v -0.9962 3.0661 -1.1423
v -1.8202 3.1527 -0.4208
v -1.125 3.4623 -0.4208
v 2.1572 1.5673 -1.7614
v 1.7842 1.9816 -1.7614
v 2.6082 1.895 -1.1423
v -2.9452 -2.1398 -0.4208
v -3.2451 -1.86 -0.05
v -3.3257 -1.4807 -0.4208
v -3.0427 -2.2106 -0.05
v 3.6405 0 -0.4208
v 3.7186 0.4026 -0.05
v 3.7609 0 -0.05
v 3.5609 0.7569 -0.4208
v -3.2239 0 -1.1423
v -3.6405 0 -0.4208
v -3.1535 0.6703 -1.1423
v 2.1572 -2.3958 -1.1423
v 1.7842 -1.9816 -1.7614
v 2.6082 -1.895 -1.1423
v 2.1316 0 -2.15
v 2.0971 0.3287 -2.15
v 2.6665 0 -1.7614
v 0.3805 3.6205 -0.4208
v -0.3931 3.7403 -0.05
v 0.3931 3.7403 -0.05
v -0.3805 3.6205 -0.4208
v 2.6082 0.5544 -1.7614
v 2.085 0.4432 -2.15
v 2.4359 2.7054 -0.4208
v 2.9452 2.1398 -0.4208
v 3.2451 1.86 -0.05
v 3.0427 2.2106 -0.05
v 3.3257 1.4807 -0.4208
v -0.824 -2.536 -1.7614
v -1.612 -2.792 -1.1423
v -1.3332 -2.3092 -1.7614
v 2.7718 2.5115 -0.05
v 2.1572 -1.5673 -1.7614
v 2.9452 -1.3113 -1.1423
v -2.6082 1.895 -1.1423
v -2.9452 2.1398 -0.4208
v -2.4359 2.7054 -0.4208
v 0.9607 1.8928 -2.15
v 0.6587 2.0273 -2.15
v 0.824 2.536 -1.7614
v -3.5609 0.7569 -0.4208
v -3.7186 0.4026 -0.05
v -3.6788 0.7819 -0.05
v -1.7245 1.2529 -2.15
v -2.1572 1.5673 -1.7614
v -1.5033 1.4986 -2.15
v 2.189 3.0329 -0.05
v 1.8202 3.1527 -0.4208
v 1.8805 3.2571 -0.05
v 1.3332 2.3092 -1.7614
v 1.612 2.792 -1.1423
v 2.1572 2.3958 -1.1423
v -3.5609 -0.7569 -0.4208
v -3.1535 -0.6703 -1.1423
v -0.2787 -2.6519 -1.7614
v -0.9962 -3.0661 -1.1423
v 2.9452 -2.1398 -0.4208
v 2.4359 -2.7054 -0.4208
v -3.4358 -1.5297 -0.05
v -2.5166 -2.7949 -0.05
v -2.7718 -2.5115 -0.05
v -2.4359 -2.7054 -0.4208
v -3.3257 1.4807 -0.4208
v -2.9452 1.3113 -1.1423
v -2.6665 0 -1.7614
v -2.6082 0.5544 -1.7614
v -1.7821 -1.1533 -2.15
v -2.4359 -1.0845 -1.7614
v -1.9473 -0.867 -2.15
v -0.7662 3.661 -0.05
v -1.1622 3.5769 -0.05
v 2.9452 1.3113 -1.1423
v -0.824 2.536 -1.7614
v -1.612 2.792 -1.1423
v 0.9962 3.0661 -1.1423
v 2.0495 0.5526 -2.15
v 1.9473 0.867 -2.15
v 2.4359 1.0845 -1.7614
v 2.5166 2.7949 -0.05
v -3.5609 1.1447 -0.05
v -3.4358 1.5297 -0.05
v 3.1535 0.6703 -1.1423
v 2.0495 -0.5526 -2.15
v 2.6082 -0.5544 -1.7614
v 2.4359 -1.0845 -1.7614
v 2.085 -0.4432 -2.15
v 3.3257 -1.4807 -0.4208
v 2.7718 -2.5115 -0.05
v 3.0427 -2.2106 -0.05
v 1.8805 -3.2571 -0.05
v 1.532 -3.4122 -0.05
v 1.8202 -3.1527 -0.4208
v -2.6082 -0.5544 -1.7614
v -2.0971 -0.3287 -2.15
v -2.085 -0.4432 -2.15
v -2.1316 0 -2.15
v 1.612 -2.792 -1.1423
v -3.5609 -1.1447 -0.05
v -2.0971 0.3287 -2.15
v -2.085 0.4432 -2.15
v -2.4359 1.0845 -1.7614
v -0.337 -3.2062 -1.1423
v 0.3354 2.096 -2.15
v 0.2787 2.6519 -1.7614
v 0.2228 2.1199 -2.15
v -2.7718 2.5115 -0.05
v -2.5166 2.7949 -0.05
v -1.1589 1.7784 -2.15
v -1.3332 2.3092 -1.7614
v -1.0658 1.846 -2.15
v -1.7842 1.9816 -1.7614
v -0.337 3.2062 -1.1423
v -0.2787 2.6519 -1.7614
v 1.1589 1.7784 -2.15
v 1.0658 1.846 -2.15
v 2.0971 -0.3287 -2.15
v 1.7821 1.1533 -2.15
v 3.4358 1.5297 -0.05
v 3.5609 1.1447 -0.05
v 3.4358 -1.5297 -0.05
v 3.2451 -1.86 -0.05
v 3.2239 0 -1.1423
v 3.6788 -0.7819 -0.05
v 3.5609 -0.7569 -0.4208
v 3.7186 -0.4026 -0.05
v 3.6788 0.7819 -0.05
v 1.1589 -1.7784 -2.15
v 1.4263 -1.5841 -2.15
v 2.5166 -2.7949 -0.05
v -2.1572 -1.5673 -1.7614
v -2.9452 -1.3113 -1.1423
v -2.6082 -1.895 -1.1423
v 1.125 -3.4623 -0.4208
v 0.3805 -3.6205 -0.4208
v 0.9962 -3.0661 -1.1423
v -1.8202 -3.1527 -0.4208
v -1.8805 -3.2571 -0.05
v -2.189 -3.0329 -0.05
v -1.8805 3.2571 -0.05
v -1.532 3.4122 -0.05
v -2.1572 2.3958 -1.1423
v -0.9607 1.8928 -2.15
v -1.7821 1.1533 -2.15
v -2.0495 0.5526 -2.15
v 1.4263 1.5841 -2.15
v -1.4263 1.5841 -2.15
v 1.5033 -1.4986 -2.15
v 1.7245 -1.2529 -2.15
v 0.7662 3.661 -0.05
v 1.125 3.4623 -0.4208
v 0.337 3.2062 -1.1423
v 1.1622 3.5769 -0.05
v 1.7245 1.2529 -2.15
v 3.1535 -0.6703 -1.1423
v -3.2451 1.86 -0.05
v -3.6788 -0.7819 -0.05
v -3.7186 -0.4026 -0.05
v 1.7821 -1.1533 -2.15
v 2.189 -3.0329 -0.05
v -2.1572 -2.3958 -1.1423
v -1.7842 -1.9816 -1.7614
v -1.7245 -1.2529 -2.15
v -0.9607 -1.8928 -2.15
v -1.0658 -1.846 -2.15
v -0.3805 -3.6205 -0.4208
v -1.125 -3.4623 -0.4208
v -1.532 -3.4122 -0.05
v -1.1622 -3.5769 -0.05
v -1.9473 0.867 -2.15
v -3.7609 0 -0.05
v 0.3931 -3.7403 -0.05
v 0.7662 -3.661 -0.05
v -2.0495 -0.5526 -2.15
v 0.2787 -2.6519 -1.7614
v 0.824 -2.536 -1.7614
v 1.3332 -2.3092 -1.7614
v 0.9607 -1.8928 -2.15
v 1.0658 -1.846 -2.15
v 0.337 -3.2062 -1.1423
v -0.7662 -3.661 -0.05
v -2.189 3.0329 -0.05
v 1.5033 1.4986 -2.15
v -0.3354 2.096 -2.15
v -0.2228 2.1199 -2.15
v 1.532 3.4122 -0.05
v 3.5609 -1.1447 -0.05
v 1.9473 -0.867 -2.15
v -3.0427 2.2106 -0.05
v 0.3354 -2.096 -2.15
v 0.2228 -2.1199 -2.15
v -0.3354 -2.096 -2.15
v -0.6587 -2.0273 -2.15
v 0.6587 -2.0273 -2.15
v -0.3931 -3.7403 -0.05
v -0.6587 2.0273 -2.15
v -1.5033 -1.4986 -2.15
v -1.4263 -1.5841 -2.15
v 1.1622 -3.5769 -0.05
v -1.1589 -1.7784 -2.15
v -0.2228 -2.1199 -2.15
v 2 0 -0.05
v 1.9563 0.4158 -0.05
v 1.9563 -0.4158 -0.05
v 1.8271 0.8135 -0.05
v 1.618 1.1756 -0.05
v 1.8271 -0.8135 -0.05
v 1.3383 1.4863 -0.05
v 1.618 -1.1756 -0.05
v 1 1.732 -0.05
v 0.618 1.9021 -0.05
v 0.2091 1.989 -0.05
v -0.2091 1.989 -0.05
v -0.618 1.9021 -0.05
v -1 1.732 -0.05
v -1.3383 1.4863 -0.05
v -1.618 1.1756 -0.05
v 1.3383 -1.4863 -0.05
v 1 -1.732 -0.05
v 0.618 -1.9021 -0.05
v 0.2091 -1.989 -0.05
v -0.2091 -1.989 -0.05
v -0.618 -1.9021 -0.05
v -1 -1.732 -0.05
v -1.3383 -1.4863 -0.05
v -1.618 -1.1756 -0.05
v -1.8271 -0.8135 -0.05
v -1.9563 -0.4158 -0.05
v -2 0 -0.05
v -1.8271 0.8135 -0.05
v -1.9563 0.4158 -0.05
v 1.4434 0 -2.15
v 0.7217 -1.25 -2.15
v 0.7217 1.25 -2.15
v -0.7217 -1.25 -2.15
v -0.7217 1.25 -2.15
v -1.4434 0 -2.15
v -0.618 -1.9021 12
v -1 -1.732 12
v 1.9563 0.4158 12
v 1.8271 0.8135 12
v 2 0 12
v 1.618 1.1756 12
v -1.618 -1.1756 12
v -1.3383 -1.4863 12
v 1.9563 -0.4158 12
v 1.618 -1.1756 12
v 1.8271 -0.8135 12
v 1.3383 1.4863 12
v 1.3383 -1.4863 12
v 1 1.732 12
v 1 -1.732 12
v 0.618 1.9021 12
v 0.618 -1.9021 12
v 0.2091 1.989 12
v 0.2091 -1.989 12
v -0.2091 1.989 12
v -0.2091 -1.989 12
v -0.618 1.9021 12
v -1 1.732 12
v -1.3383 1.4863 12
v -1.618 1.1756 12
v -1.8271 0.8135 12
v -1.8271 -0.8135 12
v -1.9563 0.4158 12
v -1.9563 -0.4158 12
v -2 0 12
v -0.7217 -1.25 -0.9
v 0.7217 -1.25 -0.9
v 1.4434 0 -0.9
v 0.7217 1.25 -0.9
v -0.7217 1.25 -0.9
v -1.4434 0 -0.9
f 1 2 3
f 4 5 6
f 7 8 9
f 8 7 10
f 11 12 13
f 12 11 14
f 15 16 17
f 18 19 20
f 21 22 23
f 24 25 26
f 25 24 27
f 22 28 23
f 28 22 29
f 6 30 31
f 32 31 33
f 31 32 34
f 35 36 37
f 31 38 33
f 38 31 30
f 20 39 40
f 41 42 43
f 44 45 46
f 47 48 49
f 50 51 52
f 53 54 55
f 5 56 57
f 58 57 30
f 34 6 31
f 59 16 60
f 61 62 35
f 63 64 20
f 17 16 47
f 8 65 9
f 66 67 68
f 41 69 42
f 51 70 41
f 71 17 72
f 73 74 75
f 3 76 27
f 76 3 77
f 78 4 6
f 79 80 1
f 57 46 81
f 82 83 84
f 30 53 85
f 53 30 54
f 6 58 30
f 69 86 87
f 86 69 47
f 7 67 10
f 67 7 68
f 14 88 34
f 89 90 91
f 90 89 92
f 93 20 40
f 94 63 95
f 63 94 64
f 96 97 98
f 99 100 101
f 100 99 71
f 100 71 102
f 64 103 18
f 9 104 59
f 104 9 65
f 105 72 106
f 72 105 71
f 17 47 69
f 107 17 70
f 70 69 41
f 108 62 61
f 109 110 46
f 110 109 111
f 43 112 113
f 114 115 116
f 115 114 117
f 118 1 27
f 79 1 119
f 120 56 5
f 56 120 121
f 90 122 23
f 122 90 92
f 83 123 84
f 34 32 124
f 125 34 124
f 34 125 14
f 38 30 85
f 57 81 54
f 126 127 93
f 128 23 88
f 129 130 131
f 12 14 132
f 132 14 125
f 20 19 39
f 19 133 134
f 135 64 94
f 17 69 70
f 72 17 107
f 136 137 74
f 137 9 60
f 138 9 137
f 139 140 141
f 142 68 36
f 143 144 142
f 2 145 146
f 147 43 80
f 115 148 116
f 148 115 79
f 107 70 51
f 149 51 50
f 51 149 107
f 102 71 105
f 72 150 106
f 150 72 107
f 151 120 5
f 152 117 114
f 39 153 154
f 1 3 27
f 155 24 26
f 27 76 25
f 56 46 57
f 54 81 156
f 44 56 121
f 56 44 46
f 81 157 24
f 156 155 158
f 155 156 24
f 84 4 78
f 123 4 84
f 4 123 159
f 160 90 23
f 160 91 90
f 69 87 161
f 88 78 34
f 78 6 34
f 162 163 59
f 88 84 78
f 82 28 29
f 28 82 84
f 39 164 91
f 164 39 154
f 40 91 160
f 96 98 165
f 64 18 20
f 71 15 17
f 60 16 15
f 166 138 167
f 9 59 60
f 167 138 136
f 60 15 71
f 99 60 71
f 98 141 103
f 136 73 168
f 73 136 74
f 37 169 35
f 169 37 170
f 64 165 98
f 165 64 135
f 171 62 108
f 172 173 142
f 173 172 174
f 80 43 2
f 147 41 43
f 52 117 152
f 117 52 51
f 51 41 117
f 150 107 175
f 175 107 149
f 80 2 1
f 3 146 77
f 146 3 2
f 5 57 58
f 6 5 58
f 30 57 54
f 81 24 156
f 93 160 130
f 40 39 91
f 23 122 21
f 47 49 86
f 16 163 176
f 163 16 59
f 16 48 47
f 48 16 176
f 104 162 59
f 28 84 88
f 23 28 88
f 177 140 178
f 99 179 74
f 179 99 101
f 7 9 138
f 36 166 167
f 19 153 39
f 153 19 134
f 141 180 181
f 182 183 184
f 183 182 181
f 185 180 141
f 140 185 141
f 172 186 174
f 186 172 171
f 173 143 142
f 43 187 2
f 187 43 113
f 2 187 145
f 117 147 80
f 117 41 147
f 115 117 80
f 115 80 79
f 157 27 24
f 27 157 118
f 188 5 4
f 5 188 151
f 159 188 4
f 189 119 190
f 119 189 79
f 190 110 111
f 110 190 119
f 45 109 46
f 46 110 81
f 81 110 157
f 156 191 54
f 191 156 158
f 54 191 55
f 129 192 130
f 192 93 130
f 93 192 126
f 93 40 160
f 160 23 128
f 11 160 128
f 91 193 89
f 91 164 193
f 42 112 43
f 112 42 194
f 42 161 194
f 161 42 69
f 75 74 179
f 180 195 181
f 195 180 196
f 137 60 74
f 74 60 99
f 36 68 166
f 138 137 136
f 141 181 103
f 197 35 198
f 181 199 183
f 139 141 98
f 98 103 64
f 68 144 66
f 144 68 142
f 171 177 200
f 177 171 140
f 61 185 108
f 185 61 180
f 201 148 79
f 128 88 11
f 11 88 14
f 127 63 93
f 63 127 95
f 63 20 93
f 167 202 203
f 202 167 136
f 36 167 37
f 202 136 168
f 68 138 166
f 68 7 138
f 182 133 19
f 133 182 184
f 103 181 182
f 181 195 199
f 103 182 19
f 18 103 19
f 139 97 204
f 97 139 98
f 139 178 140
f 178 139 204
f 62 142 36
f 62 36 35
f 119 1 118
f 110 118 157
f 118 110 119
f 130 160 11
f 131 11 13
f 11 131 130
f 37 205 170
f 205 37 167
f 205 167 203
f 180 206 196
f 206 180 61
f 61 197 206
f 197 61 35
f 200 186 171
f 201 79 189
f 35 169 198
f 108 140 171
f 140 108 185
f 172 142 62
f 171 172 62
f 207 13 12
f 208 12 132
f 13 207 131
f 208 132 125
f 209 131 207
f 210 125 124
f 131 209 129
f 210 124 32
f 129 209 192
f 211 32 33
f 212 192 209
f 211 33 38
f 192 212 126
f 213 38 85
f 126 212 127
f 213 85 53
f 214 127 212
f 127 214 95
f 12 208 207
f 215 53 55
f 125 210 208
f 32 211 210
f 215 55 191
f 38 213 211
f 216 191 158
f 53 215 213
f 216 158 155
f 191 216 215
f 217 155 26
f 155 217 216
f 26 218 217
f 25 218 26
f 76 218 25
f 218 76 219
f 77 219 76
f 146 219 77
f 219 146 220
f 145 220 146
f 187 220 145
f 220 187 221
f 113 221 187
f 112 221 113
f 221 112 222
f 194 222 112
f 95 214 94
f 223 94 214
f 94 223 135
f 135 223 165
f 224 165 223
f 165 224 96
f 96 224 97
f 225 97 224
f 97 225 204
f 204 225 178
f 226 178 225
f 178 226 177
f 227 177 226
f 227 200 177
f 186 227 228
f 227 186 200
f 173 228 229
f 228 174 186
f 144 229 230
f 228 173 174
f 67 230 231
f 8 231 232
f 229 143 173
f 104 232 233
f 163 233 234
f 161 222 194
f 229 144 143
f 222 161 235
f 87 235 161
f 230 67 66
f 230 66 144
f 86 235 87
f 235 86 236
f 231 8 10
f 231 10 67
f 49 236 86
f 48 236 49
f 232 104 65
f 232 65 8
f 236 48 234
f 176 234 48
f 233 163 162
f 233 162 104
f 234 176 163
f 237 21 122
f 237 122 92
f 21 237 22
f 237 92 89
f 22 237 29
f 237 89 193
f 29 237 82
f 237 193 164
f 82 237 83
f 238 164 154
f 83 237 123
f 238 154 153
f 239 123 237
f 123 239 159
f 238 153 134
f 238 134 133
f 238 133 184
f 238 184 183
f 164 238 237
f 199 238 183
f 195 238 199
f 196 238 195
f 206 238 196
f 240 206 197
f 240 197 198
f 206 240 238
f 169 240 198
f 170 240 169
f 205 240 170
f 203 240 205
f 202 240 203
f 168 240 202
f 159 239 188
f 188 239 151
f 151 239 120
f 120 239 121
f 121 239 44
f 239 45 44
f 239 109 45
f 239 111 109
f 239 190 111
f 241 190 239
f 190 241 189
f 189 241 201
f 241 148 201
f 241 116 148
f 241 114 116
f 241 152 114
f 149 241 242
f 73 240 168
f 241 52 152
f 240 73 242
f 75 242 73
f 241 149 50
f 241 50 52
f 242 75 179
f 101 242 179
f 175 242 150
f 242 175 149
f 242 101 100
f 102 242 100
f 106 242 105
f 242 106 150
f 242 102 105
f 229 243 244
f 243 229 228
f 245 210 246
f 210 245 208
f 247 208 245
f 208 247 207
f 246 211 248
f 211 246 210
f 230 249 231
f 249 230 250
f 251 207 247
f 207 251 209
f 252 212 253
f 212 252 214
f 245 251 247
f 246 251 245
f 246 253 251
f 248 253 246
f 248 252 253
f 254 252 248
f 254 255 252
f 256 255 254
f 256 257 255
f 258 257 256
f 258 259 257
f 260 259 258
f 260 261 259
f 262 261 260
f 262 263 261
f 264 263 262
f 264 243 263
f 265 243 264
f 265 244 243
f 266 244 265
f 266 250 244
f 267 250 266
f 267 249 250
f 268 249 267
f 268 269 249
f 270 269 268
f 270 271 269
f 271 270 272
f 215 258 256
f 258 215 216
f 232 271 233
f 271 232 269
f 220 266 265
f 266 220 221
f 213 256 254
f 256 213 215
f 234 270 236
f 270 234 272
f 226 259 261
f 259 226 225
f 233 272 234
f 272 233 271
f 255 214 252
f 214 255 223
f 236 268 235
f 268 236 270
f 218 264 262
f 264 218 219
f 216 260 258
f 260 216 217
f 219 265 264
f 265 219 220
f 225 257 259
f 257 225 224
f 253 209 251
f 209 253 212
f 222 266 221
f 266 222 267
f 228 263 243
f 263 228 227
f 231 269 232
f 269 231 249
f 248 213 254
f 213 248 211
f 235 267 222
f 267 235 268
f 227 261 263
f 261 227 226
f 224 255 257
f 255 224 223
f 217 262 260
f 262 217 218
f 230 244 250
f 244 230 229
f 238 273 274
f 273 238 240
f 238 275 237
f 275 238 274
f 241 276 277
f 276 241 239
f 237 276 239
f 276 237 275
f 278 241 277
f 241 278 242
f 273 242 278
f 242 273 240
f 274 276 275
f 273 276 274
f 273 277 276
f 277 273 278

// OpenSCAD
/*
   Copyright 2018 Scott Bezek and the splitflap contributors

   Licensed under the Apache License, Version 2.0 (the "License");
   you may not use this file except in compliance with the License.
   You may obtain a copy of the License at

       http://www.apache.org/licenses/LICENSE-2.0

   Unless required by applicable law or agreed to in writing, software
   distributed under the License is distributed on an "AS IS" BASIS,
   WITHOUT WARRANTIES OR CONDITIONS OF ANY KIND, either express or implied.
   See the License for the specific language governing permissions and
   limitations under the License.
*/

module roughM4_7380(length) {
    eps = 0.1;
    thread_diameter = 4;
    head_diameter = 7.6;
    head_length = 2.2;
    driving_depth = 1.3;
    driving_apothem = 2.5/2;
    driving_radius = driving_apothem / cos(180/6);

    sphere_offset = 1.2;  // Just a guess
    sphere_radius = sqrt(sphere_offset*sphere_offset + (head_diameter/2)*(head_diameter/2));


    difference() {
        union() {
            translate([0, 0, -eps]) {
                cylinder(h=length+eps, d=thread_diameter, $fn=30);
            }
            difference() {
                translate([0, 0, sphere_offset]) {
                    sphere(sphere_radius, $fn=30);
                }
                translate([0, 0, sphere_radius]) {
                    cube([sphere_radius*2 + eps, sphere_radius*2 + eps, sphere_radius*2 + eps], center=true);
                }
                translate([0, 0, -sphere_radius - head_length]) {
                    cube([sphere_radius*2 + eps, sphere_radius*2 + eps, sphere_radius*2 + eps], center=true);
                }
            }
        }
        translate([0, 0, -head_length-eps]) {
            cylinder(h=driving_depth+eps, r=driving_radius, $fn=6);
        }
    }
}

roughM4_7380(12);

        module color_selector(c) {
            precision = 0.0000001;  // arbitrary
            function compare_floats(x, y, i=0) = 
                  (len(x) != len(y)) ? false  // if arrays differ in length, they can't be equal
                : (i >= len(x)) ? true  // if we've hit the end of the arrays without issue, we're equal
                : (x[i] - precision <= y[i]) && x[i] + precision >= y[i]
                    ? compare_floats(x, y, i+1)
                    : false;  // not equal, short circuit

            if (c == [0.69975, 0.69975, 0.72] || compare_floats(c, [0.69975, 0.69975, 0.72]))
                children();
        }
                    
